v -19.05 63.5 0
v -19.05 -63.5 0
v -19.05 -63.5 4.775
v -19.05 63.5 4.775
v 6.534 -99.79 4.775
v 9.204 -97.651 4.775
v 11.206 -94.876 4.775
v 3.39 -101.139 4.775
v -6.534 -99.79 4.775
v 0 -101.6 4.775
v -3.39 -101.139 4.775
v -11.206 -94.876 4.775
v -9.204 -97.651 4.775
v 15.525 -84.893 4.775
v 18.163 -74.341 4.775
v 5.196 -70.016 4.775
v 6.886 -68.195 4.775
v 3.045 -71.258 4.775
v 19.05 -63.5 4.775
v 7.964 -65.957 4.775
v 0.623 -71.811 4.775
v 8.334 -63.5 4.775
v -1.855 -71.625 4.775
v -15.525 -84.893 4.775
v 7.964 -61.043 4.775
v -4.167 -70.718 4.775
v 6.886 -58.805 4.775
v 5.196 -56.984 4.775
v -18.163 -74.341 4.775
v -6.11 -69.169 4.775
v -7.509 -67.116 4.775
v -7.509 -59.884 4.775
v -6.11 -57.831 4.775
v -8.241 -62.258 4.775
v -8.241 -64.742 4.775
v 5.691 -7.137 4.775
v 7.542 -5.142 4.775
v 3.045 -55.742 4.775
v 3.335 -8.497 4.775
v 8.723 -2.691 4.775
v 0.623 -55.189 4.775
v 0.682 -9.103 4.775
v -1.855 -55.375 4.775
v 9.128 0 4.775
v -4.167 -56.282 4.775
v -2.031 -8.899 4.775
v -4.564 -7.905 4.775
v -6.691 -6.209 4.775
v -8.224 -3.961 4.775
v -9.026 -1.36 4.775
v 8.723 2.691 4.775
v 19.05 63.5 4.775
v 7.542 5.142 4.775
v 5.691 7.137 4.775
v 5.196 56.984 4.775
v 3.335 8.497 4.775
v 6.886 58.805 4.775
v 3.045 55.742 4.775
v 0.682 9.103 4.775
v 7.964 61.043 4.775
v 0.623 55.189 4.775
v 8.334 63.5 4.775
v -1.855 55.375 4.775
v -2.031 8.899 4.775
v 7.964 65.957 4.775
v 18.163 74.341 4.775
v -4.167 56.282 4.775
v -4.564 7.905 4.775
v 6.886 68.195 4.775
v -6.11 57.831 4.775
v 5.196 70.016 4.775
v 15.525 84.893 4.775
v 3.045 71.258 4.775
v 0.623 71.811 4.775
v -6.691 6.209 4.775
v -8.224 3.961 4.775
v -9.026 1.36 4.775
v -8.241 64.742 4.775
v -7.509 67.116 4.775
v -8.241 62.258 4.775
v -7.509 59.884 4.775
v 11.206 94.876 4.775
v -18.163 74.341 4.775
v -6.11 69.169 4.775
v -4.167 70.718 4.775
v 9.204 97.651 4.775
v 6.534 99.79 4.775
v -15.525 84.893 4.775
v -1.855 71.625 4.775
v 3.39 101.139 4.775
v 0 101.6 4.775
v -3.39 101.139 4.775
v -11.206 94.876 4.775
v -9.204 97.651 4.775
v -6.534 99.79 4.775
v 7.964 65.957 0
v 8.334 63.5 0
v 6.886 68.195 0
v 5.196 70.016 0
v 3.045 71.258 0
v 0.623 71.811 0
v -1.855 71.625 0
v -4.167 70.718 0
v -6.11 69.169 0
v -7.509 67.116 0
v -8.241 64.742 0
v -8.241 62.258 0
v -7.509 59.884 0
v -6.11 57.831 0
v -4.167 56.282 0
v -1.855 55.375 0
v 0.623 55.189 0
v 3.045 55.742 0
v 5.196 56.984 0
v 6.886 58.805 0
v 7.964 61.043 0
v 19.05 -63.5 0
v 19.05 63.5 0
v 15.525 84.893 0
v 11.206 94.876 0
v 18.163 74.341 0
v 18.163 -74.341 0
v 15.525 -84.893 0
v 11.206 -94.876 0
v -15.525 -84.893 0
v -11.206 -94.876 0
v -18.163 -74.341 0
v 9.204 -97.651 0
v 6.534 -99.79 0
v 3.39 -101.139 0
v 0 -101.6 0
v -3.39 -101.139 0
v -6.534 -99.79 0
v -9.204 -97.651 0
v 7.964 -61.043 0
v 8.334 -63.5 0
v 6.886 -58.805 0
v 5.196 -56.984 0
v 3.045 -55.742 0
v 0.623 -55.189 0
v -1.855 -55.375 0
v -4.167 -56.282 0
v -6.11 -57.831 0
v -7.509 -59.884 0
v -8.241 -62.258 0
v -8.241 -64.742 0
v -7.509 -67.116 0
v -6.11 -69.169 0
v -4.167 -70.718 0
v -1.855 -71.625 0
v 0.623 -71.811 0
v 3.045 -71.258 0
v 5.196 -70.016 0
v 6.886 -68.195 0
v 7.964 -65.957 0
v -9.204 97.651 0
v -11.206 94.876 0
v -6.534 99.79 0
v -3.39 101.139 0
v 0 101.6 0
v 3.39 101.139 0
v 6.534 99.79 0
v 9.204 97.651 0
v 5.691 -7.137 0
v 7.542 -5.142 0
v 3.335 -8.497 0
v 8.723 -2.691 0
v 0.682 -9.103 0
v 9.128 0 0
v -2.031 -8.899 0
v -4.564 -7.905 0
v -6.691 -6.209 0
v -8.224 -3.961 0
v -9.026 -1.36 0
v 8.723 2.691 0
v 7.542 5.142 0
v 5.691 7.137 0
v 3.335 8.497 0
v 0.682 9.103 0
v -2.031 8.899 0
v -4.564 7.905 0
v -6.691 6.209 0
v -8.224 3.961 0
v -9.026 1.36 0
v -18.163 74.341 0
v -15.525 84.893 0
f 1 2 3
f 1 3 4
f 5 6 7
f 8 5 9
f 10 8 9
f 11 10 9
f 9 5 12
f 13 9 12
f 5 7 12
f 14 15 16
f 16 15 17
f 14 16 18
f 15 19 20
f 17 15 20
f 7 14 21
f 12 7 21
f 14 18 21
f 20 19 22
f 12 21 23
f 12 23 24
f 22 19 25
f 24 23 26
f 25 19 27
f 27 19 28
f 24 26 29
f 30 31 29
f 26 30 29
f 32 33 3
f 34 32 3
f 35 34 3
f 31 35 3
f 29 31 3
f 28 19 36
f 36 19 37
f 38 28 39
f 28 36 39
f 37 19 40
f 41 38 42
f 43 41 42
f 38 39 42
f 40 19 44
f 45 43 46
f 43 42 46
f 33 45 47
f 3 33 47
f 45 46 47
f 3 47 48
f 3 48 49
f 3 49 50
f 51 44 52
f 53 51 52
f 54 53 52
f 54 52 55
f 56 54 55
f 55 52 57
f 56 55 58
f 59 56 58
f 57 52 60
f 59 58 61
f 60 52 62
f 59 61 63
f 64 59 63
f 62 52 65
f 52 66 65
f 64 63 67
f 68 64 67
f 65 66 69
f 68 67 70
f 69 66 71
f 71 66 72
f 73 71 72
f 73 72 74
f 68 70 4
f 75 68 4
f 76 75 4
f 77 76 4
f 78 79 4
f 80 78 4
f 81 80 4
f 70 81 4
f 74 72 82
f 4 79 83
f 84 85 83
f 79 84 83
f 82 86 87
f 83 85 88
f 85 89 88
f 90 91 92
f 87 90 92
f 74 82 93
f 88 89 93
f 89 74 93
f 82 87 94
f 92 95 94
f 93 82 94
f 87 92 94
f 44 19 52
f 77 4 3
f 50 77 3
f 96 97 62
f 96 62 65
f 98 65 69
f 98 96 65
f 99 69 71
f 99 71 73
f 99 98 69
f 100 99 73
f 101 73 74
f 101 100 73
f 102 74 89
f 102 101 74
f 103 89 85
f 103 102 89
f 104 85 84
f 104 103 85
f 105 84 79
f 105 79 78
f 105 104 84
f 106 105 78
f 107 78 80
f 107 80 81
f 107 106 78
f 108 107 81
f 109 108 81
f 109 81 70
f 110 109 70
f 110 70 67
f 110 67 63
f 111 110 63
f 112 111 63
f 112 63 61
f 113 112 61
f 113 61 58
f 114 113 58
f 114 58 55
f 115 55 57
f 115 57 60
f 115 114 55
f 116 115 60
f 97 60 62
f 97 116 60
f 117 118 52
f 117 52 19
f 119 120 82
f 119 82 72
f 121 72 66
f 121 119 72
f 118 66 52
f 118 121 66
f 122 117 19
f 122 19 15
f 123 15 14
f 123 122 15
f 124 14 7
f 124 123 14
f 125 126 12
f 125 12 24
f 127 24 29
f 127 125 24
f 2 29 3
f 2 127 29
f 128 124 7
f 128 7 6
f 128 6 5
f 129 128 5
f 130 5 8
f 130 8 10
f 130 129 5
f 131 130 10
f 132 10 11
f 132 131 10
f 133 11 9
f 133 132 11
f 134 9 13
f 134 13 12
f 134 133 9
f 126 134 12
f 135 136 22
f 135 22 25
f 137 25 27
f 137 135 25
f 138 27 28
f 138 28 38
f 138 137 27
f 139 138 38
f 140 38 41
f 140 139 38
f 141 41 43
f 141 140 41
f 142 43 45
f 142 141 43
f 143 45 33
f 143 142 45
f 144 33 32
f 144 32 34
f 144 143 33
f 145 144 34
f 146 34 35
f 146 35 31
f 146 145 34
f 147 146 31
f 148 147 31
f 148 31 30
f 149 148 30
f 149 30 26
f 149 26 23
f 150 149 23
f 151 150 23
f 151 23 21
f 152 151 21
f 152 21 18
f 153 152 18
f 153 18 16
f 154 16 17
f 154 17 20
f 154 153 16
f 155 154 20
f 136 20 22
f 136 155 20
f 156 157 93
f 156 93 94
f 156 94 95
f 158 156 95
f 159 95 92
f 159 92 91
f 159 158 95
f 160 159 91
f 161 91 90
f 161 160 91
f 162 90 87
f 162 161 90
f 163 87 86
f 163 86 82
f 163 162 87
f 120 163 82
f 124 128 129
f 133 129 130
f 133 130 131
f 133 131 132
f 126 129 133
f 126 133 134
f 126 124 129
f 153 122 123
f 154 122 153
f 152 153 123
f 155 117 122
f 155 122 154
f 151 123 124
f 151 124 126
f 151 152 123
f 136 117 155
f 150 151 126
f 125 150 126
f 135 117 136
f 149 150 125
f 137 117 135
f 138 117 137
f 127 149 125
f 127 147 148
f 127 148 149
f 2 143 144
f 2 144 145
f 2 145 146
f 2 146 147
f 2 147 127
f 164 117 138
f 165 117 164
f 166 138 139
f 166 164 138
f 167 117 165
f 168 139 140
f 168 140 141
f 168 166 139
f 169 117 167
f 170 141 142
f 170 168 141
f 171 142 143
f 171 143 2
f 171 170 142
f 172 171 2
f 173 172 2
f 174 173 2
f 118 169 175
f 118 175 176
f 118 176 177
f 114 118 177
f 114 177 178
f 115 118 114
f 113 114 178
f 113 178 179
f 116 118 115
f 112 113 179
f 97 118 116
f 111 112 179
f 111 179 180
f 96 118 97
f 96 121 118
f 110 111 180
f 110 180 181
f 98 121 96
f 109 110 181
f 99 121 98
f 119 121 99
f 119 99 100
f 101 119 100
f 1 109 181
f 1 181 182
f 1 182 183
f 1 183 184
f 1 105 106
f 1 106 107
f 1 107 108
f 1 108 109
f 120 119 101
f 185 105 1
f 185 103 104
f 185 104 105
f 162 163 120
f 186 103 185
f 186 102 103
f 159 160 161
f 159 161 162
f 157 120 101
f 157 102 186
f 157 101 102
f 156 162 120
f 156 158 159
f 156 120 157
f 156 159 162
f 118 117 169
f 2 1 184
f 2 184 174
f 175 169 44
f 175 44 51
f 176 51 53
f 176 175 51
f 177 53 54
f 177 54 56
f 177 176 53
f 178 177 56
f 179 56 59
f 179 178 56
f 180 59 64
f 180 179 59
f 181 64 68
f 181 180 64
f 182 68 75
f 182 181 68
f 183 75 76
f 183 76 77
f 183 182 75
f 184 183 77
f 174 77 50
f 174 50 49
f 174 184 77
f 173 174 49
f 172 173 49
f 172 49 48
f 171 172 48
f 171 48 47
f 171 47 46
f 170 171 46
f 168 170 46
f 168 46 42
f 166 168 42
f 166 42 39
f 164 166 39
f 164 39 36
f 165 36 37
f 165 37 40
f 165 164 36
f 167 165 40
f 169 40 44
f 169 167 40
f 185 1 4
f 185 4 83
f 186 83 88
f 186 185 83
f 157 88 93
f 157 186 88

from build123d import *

# Parameters (mm, degrees)
SKETCH1_R          = 9.128125
SKETCH1_R_2        = 8.334375
BASE_EXTRUDE_DEPTH = 4.7752


with BuildPart() as part:
    # Sketch1 → Base-Extrude (new body)
    with BuildSketch(Plane.XY):
        with BuildLine():
            Line((19.05, 63.5), (19.05, -63.5))
            ThreePointArc((19.05, -63.5), (17.059251197, -79.671062799), (11.205882353, -94.876470588))
            ThreePointArc((11.205882353, -94.876470588), (0, -101.6), (-11.205882353, -94.876470588))
            ThreePointArc((-11.205882353, -94.876470588), (-17.059251197, -79.671062799), (-19.05, -63.5))
            Line((-19.05, -63.5), (-19.05, 63.5))
            ThreePointArc((-19.05, 63.5), (-17.059251197, 79.671062799), (-11.205882353, 94.876470588))
            ThreePointArc((-11.205882353, 94.876470588), (0, 101.6), (11.205882353, 94.876470588))
            ThreePointArc((11.205882353, 94.876470588), (17.059251197, 79.671062799), (19.05, 63.5))
        make_face()
        Circle(SKETCH1_R, mode=Mode.SUBTRACT)
        with Locations((0, -63.5)):
            Circle(SKETCH1_R_2, mode=Mode.SUBTRACT)
        with Locations((0, 63.5)):
            Circle(SKETCH1_R_2, mode=Mode.SUBTRACT)
    extrude(amount=BASE_EXTRUDE_DEPTH)


solid = part.part
